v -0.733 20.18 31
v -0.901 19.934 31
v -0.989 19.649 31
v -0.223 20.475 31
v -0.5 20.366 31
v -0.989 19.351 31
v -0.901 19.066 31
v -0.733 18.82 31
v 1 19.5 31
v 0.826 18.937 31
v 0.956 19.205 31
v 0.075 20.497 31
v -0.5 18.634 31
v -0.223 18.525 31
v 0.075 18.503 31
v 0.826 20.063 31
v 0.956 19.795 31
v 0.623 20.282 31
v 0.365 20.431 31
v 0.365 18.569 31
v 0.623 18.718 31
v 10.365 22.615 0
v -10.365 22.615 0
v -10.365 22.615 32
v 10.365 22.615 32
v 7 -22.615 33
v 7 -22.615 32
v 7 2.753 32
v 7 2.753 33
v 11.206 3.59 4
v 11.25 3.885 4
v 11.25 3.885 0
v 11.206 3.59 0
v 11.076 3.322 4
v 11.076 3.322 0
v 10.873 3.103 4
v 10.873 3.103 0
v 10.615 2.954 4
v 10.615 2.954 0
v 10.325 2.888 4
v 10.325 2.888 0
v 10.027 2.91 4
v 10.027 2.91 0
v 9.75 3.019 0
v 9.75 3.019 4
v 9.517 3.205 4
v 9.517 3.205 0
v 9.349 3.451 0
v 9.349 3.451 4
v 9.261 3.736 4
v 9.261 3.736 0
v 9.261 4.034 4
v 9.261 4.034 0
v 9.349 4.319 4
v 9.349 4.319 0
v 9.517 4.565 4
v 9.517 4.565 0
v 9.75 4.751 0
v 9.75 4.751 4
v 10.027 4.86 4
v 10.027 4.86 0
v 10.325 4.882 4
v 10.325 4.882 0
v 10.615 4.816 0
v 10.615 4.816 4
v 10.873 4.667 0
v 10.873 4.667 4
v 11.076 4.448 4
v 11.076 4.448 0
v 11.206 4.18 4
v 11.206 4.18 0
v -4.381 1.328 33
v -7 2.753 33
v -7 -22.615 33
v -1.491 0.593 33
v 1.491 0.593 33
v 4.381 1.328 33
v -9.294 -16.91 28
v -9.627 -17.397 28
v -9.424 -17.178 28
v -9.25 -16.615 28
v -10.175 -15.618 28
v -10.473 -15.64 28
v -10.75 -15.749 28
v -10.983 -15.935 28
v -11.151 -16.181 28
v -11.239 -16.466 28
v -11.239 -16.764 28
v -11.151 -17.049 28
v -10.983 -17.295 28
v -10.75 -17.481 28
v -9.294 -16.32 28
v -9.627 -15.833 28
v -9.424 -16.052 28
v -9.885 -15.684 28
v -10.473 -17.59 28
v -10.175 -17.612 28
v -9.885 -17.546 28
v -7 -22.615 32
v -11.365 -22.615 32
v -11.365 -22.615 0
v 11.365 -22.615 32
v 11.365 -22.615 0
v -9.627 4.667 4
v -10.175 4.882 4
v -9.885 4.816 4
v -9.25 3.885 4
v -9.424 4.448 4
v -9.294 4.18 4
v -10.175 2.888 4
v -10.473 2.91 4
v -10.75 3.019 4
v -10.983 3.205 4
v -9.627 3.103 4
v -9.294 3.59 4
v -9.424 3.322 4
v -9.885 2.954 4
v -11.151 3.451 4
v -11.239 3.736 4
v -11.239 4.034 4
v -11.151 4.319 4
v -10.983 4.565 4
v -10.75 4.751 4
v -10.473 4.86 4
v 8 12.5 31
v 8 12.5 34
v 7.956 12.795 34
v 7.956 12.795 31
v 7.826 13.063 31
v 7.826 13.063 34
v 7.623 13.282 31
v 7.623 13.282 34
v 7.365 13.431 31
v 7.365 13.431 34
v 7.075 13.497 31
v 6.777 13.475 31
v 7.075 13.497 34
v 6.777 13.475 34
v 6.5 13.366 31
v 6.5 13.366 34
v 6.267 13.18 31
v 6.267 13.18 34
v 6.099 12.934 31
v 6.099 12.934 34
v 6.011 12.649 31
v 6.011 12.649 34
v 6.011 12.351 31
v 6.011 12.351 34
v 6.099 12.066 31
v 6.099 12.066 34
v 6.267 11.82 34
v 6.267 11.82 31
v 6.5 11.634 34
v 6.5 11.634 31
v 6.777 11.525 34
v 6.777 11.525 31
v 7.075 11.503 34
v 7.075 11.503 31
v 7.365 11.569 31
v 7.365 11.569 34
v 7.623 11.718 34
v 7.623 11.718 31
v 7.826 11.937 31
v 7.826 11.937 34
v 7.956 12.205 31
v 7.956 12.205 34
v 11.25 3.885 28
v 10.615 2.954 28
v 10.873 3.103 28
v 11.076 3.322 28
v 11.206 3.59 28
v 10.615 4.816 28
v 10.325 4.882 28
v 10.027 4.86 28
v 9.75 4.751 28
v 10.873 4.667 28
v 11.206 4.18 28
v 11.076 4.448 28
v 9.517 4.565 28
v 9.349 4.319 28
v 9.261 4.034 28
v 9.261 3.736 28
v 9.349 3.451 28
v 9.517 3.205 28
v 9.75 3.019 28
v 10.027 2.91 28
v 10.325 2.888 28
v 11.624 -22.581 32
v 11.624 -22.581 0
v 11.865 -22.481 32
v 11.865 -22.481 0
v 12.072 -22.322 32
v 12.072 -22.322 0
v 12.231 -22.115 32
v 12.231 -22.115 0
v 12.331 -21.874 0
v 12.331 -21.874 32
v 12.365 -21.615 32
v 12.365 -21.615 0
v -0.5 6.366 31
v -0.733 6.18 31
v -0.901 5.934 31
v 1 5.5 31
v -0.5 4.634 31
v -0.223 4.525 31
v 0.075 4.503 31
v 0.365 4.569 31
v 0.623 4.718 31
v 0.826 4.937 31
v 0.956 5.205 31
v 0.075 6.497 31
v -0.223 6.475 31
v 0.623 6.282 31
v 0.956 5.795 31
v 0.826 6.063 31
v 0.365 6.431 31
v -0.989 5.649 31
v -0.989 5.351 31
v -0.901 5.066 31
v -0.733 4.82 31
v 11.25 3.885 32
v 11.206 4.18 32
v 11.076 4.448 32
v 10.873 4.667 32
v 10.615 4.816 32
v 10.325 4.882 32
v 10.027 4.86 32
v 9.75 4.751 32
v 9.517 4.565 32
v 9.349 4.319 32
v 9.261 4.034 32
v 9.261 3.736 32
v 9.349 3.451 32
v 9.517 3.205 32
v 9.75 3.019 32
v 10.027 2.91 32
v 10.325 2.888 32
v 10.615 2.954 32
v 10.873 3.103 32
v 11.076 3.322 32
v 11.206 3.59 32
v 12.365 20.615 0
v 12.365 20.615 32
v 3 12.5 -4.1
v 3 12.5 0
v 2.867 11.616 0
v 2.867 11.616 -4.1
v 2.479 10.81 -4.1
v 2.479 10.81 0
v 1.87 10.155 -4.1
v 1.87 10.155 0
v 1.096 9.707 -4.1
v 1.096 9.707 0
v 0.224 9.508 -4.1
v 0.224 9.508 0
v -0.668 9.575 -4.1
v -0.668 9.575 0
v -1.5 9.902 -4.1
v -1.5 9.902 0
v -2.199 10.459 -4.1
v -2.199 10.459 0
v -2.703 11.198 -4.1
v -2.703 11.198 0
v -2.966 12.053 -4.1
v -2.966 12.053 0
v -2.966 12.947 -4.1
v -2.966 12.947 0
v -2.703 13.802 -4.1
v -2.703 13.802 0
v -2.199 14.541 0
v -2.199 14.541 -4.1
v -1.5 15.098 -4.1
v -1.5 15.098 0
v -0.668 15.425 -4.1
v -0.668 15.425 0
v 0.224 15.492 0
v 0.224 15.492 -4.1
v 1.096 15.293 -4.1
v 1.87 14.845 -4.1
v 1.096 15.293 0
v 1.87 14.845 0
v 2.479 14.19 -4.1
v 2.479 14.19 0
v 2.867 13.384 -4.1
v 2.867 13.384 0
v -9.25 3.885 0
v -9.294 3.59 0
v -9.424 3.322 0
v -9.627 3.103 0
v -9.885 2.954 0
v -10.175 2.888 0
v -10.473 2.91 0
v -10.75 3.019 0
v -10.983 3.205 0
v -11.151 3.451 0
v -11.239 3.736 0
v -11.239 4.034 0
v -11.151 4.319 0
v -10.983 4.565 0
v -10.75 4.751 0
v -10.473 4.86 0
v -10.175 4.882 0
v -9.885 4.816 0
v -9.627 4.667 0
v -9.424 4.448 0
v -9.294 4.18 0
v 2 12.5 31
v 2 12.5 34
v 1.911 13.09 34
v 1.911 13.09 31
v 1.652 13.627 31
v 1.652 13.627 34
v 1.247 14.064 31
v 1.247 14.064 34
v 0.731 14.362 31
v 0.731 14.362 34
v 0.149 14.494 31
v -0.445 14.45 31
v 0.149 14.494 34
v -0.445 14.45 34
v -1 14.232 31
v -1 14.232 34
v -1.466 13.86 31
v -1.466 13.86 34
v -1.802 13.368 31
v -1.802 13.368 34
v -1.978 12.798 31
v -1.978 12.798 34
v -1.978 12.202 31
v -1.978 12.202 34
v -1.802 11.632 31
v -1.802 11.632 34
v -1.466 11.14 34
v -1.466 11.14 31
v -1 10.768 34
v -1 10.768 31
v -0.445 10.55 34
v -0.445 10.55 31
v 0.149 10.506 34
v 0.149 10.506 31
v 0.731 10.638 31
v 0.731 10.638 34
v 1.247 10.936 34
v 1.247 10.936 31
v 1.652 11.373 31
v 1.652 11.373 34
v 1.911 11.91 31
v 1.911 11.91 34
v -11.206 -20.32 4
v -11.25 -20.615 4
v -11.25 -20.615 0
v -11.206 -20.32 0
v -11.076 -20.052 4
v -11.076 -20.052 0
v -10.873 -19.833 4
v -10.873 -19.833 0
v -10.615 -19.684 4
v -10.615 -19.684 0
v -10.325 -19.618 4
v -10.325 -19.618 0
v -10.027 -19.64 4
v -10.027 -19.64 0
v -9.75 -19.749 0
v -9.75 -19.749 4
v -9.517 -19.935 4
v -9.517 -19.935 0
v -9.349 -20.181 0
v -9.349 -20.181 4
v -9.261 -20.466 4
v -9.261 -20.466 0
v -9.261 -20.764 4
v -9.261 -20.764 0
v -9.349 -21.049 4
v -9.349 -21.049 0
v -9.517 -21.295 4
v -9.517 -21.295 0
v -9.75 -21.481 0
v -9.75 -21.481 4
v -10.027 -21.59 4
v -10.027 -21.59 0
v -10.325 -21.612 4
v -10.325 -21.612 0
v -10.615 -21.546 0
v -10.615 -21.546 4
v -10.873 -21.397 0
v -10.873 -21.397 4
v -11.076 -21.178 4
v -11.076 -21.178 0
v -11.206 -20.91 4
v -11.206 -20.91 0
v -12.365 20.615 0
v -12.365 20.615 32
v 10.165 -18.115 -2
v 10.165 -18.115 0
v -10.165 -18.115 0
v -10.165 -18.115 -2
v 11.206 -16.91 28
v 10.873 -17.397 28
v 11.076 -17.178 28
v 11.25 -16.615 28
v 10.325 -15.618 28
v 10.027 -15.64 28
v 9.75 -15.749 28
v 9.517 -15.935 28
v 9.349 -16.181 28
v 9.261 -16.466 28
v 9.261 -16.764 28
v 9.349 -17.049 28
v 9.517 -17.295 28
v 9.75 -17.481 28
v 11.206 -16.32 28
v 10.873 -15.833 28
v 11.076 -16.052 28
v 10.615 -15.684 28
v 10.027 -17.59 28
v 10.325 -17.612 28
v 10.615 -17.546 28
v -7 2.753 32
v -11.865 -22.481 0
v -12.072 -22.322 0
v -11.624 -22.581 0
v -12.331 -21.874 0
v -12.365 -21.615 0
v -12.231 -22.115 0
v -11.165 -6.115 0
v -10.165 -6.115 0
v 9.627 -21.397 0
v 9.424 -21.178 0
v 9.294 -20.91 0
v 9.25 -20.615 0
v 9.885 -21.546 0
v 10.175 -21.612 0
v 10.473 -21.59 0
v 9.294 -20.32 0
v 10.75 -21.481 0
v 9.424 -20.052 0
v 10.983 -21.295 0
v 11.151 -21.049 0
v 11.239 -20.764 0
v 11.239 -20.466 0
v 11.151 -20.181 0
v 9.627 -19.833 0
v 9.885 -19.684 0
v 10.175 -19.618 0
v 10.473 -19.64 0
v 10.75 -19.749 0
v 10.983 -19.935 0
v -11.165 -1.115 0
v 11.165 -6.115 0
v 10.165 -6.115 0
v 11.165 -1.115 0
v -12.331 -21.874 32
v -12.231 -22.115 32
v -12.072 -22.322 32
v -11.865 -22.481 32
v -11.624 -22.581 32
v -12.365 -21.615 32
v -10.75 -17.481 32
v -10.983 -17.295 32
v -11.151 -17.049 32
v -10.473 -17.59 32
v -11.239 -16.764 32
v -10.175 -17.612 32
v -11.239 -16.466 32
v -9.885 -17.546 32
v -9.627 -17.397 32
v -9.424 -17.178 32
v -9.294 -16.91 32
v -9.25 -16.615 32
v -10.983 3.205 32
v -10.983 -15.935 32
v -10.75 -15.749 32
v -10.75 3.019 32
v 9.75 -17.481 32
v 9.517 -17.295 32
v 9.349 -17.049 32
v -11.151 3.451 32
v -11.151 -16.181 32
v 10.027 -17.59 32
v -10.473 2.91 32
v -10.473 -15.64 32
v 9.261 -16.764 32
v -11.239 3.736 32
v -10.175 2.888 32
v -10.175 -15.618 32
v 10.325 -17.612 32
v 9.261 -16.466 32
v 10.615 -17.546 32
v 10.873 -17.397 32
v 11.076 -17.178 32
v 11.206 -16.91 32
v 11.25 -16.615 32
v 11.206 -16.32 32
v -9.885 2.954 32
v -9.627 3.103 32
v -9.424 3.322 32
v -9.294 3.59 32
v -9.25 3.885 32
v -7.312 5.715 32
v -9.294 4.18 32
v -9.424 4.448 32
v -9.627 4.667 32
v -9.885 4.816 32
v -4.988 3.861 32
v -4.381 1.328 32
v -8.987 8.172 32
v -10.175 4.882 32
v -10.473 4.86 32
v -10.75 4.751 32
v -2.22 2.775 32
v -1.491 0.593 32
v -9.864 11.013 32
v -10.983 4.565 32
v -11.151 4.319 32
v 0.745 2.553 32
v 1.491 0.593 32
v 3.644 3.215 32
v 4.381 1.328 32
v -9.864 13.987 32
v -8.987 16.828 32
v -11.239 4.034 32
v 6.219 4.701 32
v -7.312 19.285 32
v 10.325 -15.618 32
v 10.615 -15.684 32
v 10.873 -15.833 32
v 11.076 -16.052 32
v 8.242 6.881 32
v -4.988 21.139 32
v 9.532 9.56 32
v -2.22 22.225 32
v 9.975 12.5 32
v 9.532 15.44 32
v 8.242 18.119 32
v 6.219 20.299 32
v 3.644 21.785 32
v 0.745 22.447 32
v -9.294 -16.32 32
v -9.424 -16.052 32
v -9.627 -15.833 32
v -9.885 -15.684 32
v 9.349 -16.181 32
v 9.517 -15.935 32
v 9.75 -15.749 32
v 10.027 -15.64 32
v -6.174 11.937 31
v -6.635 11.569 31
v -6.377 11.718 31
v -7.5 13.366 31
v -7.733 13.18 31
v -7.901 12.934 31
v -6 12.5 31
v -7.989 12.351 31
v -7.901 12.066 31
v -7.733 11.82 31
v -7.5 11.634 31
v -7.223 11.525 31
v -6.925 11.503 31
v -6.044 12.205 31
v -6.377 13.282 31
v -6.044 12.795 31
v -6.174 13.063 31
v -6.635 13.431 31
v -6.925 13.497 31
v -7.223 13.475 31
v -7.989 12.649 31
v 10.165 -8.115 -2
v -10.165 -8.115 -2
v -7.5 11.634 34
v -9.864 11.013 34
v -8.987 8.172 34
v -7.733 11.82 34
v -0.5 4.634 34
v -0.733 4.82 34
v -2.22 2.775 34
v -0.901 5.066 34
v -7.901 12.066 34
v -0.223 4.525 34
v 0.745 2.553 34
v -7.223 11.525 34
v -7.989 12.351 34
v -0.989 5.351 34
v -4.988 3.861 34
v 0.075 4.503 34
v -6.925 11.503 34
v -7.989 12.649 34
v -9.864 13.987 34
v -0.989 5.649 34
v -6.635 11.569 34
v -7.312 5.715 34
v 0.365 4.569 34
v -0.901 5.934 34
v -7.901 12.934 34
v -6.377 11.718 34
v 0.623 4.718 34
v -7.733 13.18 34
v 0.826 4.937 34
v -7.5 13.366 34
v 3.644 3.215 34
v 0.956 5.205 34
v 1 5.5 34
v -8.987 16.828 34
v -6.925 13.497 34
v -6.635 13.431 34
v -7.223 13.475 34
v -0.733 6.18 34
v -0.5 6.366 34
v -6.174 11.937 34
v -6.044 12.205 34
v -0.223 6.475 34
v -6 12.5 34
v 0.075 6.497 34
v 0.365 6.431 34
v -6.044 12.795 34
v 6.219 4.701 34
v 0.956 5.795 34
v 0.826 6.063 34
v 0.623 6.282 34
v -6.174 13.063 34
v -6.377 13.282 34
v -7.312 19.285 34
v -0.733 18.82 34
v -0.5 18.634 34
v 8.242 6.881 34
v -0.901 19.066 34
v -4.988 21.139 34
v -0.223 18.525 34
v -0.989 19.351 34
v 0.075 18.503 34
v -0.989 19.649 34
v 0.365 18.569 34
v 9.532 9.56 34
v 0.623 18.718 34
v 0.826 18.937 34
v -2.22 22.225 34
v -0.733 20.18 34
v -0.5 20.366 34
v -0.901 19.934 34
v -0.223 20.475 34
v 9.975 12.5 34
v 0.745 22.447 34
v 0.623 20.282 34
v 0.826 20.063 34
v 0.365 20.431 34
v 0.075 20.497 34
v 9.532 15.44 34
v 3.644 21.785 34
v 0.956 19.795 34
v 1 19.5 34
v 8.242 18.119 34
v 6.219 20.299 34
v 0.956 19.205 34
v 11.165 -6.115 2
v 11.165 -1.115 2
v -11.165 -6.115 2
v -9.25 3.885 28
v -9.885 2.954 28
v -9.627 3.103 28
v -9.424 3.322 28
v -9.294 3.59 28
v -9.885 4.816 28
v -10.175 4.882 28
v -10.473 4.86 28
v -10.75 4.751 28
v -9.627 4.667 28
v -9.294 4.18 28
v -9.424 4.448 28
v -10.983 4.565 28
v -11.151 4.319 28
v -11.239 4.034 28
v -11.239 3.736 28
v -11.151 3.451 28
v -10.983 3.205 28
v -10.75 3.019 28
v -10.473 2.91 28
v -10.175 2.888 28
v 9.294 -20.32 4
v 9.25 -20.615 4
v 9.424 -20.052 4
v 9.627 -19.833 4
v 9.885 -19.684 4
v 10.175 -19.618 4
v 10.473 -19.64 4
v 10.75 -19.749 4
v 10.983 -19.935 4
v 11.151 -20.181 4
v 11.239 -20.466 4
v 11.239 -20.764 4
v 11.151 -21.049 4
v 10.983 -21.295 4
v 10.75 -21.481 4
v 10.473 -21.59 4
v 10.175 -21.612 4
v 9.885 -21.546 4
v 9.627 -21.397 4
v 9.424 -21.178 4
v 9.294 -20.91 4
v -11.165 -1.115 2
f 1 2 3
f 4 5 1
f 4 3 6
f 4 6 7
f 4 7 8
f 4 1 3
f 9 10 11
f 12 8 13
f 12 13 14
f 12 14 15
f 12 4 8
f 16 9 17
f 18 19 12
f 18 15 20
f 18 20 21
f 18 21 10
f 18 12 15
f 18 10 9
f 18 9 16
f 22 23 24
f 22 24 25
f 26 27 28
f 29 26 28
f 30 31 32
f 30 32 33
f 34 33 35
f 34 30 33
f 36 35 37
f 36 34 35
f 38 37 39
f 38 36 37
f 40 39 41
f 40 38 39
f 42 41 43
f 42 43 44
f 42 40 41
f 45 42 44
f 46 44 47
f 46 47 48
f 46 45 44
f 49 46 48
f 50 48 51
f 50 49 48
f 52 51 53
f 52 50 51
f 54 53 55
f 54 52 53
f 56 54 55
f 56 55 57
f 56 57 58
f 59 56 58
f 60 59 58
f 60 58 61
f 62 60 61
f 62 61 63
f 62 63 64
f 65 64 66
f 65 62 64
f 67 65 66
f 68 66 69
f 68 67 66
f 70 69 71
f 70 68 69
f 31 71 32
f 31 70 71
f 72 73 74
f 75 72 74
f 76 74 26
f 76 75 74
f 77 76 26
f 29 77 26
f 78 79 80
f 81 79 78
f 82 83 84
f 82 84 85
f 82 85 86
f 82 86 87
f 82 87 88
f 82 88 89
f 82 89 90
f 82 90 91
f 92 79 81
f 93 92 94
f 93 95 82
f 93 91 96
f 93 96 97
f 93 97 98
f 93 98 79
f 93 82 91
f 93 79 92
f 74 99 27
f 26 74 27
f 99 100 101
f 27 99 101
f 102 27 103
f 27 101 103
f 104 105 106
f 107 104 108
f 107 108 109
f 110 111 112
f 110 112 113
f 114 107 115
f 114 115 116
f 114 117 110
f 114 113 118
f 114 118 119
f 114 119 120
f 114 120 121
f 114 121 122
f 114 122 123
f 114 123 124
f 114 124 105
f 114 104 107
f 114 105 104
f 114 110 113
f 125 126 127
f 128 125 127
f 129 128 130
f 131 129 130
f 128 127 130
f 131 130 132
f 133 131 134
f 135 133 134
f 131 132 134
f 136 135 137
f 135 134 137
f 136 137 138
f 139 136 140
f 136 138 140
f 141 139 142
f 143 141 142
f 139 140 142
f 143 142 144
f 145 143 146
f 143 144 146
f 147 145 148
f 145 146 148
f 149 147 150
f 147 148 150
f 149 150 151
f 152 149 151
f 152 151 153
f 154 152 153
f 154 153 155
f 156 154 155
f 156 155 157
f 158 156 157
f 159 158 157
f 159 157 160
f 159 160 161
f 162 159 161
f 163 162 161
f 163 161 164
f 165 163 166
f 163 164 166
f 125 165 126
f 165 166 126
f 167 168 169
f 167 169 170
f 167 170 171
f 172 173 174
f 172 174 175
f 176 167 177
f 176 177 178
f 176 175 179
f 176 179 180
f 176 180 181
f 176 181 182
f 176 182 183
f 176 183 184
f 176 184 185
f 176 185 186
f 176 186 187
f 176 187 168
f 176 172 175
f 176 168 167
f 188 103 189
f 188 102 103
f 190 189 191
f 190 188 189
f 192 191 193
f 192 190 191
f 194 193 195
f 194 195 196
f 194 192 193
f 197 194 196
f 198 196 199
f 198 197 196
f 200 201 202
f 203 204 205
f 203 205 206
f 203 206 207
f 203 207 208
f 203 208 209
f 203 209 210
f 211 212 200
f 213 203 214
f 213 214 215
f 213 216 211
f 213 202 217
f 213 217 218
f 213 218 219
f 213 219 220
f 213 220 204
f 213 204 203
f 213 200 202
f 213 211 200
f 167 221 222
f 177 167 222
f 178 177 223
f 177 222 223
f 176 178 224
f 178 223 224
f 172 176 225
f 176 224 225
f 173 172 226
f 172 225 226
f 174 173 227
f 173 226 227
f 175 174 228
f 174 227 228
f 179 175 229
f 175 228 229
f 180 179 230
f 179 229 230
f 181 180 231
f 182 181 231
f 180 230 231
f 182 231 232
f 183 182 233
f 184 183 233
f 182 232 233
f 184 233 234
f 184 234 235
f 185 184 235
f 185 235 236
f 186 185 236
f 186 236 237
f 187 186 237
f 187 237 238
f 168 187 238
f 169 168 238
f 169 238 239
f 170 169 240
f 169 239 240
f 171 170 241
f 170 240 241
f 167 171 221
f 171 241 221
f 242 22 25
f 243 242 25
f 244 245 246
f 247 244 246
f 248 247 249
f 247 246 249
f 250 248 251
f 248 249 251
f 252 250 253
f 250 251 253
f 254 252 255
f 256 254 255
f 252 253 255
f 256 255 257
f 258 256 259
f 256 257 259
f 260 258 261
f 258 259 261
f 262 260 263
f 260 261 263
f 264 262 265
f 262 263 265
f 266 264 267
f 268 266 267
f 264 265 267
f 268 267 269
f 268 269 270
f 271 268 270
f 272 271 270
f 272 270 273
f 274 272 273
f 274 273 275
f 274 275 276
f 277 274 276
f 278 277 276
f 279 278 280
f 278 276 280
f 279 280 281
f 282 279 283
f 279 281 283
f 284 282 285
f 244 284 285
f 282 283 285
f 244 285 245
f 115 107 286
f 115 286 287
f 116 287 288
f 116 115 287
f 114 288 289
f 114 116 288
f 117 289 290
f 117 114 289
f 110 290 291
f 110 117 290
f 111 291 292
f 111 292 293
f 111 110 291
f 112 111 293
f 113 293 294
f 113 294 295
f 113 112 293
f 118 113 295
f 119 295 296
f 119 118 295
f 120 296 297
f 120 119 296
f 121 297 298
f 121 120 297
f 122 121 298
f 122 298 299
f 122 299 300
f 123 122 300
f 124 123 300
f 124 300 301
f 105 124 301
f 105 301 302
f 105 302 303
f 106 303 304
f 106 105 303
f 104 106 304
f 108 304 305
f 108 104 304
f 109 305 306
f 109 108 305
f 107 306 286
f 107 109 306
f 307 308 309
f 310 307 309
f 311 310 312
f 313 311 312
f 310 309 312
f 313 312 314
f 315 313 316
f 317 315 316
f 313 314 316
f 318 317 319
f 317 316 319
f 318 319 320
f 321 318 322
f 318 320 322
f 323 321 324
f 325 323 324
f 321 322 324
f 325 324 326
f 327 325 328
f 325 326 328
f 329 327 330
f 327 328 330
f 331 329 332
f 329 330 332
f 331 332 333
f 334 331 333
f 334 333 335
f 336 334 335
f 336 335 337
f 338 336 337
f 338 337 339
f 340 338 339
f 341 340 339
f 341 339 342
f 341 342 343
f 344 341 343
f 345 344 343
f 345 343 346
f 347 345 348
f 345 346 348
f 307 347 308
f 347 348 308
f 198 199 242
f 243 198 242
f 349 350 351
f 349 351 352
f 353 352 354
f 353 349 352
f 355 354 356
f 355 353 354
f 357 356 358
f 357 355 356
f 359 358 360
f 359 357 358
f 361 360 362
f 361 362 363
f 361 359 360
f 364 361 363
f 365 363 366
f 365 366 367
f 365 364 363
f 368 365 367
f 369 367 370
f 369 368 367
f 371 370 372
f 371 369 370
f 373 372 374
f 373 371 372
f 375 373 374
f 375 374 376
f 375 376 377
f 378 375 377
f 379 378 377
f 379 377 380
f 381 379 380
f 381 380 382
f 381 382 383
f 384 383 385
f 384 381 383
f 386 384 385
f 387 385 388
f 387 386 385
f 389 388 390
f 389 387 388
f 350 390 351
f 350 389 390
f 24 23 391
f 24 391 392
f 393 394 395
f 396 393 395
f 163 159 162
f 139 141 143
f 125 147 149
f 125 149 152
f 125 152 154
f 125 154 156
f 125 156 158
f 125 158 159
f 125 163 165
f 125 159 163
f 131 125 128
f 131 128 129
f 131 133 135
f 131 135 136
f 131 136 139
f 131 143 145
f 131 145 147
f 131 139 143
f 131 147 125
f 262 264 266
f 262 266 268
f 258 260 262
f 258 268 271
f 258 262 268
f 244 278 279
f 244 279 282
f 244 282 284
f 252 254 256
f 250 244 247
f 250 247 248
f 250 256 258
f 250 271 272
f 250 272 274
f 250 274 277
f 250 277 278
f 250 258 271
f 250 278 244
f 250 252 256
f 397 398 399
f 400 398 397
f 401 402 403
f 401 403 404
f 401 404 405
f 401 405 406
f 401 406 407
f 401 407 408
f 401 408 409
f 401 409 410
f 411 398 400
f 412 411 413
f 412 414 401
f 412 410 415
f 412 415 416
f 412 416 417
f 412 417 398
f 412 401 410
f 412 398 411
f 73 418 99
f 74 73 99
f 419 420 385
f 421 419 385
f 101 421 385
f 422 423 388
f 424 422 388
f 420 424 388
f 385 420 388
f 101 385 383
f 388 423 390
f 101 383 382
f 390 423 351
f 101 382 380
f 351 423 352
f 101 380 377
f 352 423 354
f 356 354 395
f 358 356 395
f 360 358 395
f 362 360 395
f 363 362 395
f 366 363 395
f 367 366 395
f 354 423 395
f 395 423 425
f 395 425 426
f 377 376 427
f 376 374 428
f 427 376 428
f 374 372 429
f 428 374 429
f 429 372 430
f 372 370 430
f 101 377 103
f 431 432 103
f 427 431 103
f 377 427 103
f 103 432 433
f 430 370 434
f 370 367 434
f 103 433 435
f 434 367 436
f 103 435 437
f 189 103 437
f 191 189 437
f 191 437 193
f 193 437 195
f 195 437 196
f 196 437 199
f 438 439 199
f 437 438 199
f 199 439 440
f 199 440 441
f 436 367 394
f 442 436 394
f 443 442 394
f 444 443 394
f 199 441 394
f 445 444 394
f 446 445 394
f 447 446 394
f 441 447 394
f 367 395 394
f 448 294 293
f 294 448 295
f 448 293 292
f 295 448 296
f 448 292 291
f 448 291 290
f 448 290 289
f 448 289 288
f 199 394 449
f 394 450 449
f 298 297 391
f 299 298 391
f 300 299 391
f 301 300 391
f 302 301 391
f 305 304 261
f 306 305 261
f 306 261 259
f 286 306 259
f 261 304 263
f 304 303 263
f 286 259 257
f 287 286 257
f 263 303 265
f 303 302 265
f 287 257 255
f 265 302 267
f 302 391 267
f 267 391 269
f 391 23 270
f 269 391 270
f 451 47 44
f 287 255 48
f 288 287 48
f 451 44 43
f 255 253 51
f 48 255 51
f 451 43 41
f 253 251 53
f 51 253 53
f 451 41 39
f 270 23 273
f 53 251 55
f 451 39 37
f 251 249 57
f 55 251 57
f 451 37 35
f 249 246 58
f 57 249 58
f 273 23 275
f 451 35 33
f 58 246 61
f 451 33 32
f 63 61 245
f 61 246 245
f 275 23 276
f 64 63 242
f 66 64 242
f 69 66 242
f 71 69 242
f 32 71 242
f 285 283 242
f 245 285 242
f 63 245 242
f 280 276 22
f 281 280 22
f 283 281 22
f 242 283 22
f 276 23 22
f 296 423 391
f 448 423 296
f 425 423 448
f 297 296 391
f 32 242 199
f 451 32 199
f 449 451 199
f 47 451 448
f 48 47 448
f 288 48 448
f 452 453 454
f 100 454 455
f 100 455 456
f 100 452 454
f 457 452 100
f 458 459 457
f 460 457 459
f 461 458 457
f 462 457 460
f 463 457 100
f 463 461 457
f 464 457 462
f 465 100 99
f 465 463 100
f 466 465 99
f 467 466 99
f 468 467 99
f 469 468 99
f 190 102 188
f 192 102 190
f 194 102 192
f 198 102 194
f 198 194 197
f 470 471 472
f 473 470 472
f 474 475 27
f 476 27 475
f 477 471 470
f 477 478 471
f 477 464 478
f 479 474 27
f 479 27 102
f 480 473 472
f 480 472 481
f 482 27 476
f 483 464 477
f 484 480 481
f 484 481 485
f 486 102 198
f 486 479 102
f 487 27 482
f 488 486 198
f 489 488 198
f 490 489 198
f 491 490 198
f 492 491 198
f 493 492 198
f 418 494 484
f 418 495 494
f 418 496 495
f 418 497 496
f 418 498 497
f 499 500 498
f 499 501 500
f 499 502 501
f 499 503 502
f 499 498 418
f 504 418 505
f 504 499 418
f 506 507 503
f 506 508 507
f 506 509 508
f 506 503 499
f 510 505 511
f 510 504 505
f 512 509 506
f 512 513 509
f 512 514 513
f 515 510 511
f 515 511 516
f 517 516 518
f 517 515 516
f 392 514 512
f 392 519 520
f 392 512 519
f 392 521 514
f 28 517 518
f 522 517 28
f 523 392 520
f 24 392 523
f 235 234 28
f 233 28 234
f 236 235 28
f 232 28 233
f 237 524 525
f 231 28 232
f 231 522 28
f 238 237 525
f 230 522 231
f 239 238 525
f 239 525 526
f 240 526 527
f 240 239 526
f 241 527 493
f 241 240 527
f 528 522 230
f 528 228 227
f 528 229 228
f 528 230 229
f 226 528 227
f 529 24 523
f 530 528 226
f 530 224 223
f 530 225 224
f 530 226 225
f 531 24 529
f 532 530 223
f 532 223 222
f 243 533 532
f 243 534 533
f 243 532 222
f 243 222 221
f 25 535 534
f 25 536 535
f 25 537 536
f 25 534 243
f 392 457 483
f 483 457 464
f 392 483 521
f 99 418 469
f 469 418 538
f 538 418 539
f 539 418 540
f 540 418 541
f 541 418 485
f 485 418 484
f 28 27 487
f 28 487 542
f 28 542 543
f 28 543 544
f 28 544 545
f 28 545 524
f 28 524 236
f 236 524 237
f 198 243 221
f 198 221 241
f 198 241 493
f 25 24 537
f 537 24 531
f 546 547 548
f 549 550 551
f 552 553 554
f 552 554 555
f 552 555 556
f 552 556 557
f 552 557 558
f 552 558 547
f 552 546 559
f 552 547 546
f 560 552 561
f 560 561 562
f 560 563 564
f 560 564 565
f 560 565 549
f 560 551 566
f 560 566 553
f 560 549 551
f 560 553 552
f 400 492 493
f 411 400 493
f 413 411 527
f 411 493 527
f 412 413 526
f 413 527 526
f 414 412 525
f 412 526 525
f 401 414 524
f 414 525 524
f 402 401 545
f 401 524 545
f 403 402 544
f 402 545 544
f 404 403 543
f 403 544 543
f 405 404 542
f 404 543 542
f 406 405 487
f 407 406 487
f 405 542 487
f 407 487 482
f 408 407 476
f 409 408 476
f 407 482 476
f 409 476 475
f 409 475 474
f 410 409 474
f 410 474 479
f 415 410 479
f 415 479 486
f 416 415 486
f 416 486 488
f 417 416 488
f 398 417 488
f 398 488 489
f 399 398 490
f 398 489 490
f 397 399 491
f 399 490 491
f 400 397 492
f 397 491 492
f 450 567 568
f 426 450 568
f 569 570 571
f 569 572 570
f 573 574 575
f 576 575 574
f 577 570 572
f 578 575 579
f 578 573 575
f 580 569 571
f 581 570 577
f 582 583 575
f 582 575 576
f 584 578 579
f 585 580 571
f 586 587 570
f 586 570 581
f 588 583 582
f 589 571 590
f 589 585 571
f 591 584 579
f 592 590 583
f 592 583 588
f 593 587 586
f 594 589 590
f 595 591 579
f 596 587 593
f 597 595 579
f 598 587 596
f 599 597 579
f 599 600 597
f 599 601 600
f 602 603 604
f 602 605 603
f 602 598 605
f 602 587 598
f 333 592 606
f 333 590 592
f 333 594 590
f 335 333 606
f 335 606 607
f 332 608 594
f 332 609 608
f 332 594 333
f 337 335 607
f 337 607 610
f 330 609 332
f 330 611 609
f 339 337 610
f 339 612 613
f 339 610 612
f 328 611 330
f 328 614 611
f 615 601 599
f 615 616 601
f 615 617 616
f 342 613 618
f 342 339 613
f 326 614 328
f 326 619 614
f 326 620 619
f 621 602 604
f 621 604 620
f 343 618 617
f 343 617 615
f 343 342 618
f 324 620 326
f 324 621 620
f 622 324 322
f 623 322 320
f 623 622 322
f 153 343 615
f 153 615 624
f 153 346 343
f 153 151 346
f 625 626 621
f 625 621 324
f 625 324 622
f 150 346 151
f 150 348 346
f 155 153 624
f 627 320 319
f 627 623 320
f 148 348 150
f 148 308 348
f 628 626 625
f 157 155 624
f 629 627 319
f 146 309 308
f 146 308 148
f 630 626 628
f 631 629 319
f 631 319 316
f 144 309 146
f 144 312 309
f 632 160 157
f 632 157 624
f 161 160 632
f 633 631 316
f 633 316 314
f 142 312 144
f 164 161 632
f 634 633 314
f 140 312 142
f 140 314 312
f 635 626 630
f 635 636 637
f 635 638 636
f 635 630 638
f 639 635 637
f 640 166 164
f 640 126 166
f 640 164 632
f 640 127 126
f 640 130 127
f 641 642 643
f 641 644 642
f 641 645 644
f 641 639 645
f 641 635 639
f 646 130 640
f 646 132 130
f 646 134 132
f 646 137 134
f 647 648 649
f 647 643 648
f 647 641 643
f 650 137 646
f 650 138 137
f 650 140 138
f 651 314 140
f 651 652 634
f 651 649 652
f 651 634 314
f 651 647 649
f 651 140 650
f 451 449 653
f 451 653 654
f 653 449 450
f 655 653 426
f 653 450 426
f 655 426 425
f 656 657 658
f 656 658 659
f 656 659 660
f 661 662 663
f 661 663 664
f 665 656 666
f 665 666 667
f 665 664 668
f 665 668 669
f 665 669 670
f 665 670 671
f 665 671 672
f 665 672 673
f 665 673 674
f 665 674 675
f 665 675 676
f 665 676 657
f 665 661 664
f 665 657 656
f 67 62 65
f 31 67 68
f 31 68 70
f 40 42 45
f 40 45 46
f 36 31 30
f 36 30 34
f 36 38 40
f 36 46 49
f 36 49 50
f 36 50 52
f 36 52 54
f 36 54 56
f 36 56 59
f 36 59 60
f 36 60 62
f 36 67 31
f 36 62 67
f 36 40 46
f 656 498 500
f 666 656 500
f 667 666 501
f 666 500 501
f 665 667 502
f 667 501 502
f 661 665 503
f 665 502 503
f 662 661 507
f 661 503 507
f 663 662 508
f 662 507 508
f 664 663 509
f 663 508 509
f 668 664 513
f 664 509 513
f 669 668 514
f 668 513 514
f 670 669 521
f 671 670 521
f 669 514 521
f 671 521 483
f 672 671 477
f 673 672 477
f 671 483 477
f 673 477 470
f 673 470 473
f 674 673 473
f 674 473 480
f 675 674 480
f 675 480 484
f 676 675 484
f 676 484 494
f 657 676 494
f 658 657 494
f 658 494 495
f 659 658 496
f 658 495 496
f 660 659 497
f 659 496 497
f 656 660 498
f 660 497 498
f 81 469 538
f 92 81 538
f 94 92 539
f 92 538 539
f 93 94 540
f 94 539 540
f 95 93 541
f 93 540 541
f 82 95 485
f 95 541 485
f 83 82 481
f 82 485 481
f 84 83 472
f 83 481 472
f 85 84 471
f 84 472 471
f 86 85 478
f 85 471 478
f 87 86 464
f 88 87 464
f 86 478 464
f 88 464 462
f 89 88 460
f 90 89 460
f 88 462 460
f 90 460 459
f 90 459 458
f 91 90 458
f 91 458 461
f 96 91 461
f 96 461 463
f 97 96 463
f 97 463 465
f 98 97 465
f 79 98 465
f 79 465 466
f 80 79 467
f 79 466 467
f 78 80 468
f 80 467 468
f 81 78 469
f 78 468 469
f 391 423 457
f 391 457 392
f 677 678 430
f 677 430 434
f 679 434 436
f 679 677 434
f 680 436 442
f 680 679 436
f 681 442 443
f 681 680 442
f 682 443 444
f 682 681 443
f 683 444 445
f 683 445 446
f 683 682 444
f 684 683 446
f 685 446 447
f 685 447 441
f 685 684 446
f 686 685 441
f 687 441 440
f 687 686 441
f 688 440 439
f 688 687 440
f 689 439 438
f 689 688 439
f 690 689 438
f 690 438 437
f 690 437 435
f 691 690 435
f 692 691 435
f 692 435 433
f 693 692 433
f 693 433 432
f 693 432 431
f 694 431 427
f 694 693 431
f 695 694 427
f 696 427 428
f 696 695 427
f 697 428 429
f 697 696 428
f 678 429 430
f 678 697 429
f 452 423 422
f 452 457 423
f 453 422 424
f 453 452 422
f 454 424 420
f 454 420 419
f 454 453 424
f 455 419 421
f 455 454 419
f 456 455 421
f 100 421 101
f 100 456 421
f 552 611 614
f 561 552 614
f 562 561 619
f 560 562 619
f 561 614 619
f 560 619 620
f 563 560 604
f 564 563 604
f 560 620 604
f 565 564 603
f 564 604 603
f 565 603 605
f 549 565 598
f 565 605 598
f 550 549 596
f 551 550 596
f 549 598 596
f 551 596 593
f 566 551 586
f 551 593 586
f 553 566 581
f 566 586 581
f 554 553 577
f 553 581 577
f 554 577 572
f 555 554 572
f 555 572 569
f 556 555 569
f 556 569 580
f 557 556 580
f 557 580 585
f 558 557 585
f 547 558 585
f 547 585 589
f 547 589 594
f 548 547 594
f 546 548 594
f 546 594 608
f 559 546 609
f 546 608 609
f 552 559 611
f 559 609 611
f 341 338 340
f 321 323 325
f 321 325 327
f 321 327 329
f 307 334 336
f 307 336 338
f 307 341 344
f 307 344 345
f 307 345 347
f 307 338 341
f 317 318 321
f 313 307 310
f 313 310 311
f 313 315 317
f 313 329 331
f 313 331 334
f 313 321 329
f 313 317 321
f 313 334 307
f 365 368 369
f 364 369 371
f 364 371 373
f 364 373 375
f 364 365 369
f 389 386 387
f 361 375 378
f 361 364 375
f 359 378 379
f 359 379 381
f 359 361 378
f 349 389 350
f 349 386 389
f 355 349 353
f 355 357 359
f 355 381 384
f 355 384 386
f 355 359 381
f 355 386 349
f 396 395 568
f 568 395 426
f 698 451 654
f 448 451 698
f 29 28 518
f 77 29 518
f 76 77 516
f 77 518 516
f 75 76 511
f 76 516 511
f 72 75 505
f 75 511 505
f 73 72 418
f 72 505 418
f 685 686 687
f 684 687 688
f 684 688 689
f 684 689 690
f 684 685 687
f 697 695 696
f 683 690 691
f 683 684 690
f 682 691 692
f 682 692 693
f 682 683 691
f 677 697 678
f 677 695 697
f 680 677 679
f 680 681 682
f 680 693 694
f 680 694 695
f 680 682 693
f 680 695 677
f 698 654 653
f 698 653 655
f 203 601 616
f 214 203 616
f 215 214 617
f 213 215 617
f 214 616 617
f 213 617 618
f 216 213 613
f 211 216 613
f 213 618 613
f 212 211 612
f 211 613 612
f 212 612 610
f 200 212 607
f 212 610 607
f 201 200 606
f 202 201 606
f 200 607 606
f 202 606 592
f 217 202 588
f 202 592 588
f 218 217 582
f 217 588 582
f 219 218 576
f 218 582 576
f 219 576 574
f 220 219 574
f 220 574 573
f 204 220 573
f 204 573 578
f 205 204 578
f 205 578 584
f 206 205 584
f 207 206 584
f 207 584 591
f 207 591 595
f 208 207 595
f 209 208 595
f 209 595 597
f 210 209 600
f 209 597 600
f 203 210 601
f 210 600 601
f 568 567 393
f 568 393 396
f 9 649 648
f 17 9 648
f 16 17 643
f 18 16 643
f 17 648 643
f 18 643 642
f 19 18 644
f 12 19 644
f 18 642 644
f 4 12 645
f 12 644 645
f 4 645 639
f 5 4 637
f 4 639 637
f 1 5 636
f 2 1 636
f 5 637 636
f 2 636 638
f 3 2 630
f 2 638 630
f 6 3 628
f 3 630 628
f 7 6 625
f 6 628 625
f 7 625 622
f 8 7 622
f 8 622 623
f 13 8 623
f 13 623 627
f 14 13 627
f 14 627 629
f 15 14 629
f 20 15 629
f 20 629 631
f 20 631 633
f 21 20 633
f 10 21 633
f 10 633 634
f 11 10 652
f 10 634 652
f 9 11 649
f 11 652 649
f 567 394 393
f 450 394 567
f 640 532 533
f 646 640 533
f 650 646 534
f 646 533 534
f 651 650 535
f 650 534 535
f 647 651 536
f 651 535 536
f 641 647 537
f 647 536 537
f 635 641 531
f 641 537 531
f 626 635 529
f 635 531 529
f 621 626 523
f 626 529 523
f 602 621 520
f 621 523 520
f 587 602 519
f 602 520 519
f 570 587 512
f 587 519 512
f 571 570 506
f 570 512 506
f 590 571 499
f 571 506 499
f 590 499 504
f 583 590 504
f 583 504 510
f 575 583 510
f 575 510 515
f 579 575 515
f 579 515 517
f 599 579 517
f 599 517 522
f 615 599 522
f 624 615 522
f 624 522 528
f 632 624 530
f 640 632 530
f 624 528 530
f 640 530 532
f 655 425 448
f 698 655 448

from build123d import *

# Parameters (mm, degrees)
SKETCH_1_W          = 24.73
SKETCH_1_H          = 45.23
EXTRUDE_1_DEPTH     = 32
CHAMFER_1_SIZE      = 2
EXTRUDE_2_DEPTH     = 1
SKETCH_3_R          = 1
CUT_EXTRUDE_1_DEPTH = 4
SKETCH_4_R          = 9.975
EXTRUDE_3_DEPTH     = 2
SKETCH_5_R          = 2
SKETCH_5_R_2        = 1
CUT_EXTRUDE_2_DEPTH = 3
SKETCH_6_W          = 20.33
SKETCH_6_H          = 12
EXTRUDE_4_DEPTH     = 2
CHAMFER_2_SIZE      = 2
SKETCH_7_W          = 22.33
SKETCH_7_H          = 5
CUT_EXTRUDE_3_DEPTH = 2
SKETCH_8_R          = 3
EXTRUDE_5_DEPTH     = 4.1
CUT_EXTRUDE_START   = -4
SKETCH_9_R          = 1
CUT_EXTRUDE_4_DEPTH = 4
FILLET_1_R          = 1


with BuildPart() as part:
    # 스케치1 → 보스-돌출1 (new body)
    with BuildSketch(Plane.XY):
        Rectangle(SKETCH_1_W, SKETCH_1_H)
    extrude(amount=EXTRUDE_1_DEPTH)

    # 모따기1
    chamfer_1_edges = [part.edges().sort_by_distance(p)[0] for p in [
        (-12.365, 22.615, 16),
        (12.365, 22.615, 16),
    ]]
    chamfer(chamfer_1_edges, length=CHAMFER_1_SIZE)

    # 스케치2 → 보스-돌출2 (add)
    with BuildSketch(Plane.XY.offset(32)):
        with BuildLine():
            Line((-7, -22.615), (7, -22.615))
            Line((7, -22.615), (7, 2.753205655))
            ThreePointArc((7, 2.753205655), (0, 0.5), (-7, 2.753205655))
            Line((-7, 2.753205655), (-7, -22.615))
        make_face()
    extrude(amount=EXTRUDE_2_DEPTH)

    # 스케치3 → 컷-돌출1 (cut)
    with BuildSketch(Plane.XY.offset(32)):
        with Locations((-10.25, 3.885)):
            Circle(SKETCH_3_R)
        with Locations((-10.25, -16.615)):
            Circle(SKETCH_3_R)
        with Locations((10.25, -16.615)):
            Circle(SKETCH_3_R)
        with Locations((10.25, 3.885)):
            Circle(SKETCH_3_R)
    extrude(amount=-CUT_EXTRUDE_1_DEPTH, mode=Mode.SUBTRACT)

    # 스케치4 → 보스-돌출3 (add)
    with BuildSketch(Plane.XY.offset(32)):
        with Locations((0, 12.5)):
            Circle(SKETCH_4_R)
    extrude(amount=EXTRUDE_3_DEPTH)

    # 스케치5 → 컷-돌출2 (cut)
    with BuildSketch(Plane.XY.offset(34)):
        with Locations((0, 12.5)):
            Circle(SKETCH_5_R)
        with Locations((0, 19.5)):
            Circle(SKETCH_5_R_2)
        with Locations((7, 12.5)):
            Circle(SKETCH_5_R_2)
        with Locations((0, 5.5)):
            Circle(SKETCH_5_R_2)
        with Locations((-7, 12.5)):
            Circle(SKETCH_5_R_2)
    extrude(amount=-CUT_EXTRUDE_2_DEPTH, mode=Mode.SUBTRACT)

    # 스케치6 → 보스-돌출4 (add)
    with BuildSketch(Plane(origin=(0, 0, 0), x_dir=(-1, 0, 0), z_dir=(0, 0, -1))):
        with Locations((0, -12.115)):
            Rectangle(SKETCH_6_W, SKETCH_6_H)
    extrude(amount=EXTRUDE_4_DEPTH)

    # 모따기2
    chamfer_2_edges = [part.edges().sort_by_distance(p)[0] for p in [
        (0, -6.115, -2),
    ]]
    chamfer(chamfer_2_edges, length=CHAMFER_2_SIZE - 0.0001)  # a hair under: the kernel refuses the full size

    # 스케치7 → 컷-돌출3 (cut)
    with BuildSketch(Plane(origin=(0, 0, 0), x_dir=(-1, 0, 0), z_dir=(0, 0, -1))):
        with Locations((0, -3.615)):
            Rectangle(SKETCH_7_W, SKETCH_7_H)
    extrude(amount=-CUT_EXTRUDE_3_DEPTH, mode=Mode.SUBTRACT)

    # 스케치8 → 보스-돌출5 (add)
    with BuildSketch(Plane(origin=(0, 0, 0), x_dir=(-1, 0, 0), z_dir=(0, 0, -1))):
        with Locations(Location((0, 12.5, 0), (0, 0, 180))):
            Circle(SKETCH_8_R)
    extrude(amount=EXTRUDE_5_DEPTH)

    # 스케치9 → 컷-돌출4 (cut)
    with BuildSketch(Plane(origin=(0, 0, 0), x_dir=(-1, 0, 0), z_dir=(0, 0, -1)).offset(CUT_EXTRUDE_START)):
        with Locations(Location((-10.25, 3.885, 0), (0, 0, 180))):
            Circle(SKETCH_9_R)
        with Locations(Location((10.25, 3.885, 0), (0, 0, 180))):
            Circle(SKETCH_9_R)
        with Locations((-10.25, -20.615)):
            Circle(SKETCH_9_R)
        with Locations((10.25, -20.615)):
            Circle(SKETCH_9_R)
    extrude(amount=CUT_EXTRUDE_4_DEPTH, mode=Mode.SUBTRACT)

    # 필렛1
    fillet_1_edges = [part.edges().sort_by_distance(p)[0] for p in [
        (12.365, -22.615, 16),
        (-12.365, -22.615, 16),
    ]]
    fillet(fillet_1_edges, radius=FILLET_1_R)


solid = part.part
